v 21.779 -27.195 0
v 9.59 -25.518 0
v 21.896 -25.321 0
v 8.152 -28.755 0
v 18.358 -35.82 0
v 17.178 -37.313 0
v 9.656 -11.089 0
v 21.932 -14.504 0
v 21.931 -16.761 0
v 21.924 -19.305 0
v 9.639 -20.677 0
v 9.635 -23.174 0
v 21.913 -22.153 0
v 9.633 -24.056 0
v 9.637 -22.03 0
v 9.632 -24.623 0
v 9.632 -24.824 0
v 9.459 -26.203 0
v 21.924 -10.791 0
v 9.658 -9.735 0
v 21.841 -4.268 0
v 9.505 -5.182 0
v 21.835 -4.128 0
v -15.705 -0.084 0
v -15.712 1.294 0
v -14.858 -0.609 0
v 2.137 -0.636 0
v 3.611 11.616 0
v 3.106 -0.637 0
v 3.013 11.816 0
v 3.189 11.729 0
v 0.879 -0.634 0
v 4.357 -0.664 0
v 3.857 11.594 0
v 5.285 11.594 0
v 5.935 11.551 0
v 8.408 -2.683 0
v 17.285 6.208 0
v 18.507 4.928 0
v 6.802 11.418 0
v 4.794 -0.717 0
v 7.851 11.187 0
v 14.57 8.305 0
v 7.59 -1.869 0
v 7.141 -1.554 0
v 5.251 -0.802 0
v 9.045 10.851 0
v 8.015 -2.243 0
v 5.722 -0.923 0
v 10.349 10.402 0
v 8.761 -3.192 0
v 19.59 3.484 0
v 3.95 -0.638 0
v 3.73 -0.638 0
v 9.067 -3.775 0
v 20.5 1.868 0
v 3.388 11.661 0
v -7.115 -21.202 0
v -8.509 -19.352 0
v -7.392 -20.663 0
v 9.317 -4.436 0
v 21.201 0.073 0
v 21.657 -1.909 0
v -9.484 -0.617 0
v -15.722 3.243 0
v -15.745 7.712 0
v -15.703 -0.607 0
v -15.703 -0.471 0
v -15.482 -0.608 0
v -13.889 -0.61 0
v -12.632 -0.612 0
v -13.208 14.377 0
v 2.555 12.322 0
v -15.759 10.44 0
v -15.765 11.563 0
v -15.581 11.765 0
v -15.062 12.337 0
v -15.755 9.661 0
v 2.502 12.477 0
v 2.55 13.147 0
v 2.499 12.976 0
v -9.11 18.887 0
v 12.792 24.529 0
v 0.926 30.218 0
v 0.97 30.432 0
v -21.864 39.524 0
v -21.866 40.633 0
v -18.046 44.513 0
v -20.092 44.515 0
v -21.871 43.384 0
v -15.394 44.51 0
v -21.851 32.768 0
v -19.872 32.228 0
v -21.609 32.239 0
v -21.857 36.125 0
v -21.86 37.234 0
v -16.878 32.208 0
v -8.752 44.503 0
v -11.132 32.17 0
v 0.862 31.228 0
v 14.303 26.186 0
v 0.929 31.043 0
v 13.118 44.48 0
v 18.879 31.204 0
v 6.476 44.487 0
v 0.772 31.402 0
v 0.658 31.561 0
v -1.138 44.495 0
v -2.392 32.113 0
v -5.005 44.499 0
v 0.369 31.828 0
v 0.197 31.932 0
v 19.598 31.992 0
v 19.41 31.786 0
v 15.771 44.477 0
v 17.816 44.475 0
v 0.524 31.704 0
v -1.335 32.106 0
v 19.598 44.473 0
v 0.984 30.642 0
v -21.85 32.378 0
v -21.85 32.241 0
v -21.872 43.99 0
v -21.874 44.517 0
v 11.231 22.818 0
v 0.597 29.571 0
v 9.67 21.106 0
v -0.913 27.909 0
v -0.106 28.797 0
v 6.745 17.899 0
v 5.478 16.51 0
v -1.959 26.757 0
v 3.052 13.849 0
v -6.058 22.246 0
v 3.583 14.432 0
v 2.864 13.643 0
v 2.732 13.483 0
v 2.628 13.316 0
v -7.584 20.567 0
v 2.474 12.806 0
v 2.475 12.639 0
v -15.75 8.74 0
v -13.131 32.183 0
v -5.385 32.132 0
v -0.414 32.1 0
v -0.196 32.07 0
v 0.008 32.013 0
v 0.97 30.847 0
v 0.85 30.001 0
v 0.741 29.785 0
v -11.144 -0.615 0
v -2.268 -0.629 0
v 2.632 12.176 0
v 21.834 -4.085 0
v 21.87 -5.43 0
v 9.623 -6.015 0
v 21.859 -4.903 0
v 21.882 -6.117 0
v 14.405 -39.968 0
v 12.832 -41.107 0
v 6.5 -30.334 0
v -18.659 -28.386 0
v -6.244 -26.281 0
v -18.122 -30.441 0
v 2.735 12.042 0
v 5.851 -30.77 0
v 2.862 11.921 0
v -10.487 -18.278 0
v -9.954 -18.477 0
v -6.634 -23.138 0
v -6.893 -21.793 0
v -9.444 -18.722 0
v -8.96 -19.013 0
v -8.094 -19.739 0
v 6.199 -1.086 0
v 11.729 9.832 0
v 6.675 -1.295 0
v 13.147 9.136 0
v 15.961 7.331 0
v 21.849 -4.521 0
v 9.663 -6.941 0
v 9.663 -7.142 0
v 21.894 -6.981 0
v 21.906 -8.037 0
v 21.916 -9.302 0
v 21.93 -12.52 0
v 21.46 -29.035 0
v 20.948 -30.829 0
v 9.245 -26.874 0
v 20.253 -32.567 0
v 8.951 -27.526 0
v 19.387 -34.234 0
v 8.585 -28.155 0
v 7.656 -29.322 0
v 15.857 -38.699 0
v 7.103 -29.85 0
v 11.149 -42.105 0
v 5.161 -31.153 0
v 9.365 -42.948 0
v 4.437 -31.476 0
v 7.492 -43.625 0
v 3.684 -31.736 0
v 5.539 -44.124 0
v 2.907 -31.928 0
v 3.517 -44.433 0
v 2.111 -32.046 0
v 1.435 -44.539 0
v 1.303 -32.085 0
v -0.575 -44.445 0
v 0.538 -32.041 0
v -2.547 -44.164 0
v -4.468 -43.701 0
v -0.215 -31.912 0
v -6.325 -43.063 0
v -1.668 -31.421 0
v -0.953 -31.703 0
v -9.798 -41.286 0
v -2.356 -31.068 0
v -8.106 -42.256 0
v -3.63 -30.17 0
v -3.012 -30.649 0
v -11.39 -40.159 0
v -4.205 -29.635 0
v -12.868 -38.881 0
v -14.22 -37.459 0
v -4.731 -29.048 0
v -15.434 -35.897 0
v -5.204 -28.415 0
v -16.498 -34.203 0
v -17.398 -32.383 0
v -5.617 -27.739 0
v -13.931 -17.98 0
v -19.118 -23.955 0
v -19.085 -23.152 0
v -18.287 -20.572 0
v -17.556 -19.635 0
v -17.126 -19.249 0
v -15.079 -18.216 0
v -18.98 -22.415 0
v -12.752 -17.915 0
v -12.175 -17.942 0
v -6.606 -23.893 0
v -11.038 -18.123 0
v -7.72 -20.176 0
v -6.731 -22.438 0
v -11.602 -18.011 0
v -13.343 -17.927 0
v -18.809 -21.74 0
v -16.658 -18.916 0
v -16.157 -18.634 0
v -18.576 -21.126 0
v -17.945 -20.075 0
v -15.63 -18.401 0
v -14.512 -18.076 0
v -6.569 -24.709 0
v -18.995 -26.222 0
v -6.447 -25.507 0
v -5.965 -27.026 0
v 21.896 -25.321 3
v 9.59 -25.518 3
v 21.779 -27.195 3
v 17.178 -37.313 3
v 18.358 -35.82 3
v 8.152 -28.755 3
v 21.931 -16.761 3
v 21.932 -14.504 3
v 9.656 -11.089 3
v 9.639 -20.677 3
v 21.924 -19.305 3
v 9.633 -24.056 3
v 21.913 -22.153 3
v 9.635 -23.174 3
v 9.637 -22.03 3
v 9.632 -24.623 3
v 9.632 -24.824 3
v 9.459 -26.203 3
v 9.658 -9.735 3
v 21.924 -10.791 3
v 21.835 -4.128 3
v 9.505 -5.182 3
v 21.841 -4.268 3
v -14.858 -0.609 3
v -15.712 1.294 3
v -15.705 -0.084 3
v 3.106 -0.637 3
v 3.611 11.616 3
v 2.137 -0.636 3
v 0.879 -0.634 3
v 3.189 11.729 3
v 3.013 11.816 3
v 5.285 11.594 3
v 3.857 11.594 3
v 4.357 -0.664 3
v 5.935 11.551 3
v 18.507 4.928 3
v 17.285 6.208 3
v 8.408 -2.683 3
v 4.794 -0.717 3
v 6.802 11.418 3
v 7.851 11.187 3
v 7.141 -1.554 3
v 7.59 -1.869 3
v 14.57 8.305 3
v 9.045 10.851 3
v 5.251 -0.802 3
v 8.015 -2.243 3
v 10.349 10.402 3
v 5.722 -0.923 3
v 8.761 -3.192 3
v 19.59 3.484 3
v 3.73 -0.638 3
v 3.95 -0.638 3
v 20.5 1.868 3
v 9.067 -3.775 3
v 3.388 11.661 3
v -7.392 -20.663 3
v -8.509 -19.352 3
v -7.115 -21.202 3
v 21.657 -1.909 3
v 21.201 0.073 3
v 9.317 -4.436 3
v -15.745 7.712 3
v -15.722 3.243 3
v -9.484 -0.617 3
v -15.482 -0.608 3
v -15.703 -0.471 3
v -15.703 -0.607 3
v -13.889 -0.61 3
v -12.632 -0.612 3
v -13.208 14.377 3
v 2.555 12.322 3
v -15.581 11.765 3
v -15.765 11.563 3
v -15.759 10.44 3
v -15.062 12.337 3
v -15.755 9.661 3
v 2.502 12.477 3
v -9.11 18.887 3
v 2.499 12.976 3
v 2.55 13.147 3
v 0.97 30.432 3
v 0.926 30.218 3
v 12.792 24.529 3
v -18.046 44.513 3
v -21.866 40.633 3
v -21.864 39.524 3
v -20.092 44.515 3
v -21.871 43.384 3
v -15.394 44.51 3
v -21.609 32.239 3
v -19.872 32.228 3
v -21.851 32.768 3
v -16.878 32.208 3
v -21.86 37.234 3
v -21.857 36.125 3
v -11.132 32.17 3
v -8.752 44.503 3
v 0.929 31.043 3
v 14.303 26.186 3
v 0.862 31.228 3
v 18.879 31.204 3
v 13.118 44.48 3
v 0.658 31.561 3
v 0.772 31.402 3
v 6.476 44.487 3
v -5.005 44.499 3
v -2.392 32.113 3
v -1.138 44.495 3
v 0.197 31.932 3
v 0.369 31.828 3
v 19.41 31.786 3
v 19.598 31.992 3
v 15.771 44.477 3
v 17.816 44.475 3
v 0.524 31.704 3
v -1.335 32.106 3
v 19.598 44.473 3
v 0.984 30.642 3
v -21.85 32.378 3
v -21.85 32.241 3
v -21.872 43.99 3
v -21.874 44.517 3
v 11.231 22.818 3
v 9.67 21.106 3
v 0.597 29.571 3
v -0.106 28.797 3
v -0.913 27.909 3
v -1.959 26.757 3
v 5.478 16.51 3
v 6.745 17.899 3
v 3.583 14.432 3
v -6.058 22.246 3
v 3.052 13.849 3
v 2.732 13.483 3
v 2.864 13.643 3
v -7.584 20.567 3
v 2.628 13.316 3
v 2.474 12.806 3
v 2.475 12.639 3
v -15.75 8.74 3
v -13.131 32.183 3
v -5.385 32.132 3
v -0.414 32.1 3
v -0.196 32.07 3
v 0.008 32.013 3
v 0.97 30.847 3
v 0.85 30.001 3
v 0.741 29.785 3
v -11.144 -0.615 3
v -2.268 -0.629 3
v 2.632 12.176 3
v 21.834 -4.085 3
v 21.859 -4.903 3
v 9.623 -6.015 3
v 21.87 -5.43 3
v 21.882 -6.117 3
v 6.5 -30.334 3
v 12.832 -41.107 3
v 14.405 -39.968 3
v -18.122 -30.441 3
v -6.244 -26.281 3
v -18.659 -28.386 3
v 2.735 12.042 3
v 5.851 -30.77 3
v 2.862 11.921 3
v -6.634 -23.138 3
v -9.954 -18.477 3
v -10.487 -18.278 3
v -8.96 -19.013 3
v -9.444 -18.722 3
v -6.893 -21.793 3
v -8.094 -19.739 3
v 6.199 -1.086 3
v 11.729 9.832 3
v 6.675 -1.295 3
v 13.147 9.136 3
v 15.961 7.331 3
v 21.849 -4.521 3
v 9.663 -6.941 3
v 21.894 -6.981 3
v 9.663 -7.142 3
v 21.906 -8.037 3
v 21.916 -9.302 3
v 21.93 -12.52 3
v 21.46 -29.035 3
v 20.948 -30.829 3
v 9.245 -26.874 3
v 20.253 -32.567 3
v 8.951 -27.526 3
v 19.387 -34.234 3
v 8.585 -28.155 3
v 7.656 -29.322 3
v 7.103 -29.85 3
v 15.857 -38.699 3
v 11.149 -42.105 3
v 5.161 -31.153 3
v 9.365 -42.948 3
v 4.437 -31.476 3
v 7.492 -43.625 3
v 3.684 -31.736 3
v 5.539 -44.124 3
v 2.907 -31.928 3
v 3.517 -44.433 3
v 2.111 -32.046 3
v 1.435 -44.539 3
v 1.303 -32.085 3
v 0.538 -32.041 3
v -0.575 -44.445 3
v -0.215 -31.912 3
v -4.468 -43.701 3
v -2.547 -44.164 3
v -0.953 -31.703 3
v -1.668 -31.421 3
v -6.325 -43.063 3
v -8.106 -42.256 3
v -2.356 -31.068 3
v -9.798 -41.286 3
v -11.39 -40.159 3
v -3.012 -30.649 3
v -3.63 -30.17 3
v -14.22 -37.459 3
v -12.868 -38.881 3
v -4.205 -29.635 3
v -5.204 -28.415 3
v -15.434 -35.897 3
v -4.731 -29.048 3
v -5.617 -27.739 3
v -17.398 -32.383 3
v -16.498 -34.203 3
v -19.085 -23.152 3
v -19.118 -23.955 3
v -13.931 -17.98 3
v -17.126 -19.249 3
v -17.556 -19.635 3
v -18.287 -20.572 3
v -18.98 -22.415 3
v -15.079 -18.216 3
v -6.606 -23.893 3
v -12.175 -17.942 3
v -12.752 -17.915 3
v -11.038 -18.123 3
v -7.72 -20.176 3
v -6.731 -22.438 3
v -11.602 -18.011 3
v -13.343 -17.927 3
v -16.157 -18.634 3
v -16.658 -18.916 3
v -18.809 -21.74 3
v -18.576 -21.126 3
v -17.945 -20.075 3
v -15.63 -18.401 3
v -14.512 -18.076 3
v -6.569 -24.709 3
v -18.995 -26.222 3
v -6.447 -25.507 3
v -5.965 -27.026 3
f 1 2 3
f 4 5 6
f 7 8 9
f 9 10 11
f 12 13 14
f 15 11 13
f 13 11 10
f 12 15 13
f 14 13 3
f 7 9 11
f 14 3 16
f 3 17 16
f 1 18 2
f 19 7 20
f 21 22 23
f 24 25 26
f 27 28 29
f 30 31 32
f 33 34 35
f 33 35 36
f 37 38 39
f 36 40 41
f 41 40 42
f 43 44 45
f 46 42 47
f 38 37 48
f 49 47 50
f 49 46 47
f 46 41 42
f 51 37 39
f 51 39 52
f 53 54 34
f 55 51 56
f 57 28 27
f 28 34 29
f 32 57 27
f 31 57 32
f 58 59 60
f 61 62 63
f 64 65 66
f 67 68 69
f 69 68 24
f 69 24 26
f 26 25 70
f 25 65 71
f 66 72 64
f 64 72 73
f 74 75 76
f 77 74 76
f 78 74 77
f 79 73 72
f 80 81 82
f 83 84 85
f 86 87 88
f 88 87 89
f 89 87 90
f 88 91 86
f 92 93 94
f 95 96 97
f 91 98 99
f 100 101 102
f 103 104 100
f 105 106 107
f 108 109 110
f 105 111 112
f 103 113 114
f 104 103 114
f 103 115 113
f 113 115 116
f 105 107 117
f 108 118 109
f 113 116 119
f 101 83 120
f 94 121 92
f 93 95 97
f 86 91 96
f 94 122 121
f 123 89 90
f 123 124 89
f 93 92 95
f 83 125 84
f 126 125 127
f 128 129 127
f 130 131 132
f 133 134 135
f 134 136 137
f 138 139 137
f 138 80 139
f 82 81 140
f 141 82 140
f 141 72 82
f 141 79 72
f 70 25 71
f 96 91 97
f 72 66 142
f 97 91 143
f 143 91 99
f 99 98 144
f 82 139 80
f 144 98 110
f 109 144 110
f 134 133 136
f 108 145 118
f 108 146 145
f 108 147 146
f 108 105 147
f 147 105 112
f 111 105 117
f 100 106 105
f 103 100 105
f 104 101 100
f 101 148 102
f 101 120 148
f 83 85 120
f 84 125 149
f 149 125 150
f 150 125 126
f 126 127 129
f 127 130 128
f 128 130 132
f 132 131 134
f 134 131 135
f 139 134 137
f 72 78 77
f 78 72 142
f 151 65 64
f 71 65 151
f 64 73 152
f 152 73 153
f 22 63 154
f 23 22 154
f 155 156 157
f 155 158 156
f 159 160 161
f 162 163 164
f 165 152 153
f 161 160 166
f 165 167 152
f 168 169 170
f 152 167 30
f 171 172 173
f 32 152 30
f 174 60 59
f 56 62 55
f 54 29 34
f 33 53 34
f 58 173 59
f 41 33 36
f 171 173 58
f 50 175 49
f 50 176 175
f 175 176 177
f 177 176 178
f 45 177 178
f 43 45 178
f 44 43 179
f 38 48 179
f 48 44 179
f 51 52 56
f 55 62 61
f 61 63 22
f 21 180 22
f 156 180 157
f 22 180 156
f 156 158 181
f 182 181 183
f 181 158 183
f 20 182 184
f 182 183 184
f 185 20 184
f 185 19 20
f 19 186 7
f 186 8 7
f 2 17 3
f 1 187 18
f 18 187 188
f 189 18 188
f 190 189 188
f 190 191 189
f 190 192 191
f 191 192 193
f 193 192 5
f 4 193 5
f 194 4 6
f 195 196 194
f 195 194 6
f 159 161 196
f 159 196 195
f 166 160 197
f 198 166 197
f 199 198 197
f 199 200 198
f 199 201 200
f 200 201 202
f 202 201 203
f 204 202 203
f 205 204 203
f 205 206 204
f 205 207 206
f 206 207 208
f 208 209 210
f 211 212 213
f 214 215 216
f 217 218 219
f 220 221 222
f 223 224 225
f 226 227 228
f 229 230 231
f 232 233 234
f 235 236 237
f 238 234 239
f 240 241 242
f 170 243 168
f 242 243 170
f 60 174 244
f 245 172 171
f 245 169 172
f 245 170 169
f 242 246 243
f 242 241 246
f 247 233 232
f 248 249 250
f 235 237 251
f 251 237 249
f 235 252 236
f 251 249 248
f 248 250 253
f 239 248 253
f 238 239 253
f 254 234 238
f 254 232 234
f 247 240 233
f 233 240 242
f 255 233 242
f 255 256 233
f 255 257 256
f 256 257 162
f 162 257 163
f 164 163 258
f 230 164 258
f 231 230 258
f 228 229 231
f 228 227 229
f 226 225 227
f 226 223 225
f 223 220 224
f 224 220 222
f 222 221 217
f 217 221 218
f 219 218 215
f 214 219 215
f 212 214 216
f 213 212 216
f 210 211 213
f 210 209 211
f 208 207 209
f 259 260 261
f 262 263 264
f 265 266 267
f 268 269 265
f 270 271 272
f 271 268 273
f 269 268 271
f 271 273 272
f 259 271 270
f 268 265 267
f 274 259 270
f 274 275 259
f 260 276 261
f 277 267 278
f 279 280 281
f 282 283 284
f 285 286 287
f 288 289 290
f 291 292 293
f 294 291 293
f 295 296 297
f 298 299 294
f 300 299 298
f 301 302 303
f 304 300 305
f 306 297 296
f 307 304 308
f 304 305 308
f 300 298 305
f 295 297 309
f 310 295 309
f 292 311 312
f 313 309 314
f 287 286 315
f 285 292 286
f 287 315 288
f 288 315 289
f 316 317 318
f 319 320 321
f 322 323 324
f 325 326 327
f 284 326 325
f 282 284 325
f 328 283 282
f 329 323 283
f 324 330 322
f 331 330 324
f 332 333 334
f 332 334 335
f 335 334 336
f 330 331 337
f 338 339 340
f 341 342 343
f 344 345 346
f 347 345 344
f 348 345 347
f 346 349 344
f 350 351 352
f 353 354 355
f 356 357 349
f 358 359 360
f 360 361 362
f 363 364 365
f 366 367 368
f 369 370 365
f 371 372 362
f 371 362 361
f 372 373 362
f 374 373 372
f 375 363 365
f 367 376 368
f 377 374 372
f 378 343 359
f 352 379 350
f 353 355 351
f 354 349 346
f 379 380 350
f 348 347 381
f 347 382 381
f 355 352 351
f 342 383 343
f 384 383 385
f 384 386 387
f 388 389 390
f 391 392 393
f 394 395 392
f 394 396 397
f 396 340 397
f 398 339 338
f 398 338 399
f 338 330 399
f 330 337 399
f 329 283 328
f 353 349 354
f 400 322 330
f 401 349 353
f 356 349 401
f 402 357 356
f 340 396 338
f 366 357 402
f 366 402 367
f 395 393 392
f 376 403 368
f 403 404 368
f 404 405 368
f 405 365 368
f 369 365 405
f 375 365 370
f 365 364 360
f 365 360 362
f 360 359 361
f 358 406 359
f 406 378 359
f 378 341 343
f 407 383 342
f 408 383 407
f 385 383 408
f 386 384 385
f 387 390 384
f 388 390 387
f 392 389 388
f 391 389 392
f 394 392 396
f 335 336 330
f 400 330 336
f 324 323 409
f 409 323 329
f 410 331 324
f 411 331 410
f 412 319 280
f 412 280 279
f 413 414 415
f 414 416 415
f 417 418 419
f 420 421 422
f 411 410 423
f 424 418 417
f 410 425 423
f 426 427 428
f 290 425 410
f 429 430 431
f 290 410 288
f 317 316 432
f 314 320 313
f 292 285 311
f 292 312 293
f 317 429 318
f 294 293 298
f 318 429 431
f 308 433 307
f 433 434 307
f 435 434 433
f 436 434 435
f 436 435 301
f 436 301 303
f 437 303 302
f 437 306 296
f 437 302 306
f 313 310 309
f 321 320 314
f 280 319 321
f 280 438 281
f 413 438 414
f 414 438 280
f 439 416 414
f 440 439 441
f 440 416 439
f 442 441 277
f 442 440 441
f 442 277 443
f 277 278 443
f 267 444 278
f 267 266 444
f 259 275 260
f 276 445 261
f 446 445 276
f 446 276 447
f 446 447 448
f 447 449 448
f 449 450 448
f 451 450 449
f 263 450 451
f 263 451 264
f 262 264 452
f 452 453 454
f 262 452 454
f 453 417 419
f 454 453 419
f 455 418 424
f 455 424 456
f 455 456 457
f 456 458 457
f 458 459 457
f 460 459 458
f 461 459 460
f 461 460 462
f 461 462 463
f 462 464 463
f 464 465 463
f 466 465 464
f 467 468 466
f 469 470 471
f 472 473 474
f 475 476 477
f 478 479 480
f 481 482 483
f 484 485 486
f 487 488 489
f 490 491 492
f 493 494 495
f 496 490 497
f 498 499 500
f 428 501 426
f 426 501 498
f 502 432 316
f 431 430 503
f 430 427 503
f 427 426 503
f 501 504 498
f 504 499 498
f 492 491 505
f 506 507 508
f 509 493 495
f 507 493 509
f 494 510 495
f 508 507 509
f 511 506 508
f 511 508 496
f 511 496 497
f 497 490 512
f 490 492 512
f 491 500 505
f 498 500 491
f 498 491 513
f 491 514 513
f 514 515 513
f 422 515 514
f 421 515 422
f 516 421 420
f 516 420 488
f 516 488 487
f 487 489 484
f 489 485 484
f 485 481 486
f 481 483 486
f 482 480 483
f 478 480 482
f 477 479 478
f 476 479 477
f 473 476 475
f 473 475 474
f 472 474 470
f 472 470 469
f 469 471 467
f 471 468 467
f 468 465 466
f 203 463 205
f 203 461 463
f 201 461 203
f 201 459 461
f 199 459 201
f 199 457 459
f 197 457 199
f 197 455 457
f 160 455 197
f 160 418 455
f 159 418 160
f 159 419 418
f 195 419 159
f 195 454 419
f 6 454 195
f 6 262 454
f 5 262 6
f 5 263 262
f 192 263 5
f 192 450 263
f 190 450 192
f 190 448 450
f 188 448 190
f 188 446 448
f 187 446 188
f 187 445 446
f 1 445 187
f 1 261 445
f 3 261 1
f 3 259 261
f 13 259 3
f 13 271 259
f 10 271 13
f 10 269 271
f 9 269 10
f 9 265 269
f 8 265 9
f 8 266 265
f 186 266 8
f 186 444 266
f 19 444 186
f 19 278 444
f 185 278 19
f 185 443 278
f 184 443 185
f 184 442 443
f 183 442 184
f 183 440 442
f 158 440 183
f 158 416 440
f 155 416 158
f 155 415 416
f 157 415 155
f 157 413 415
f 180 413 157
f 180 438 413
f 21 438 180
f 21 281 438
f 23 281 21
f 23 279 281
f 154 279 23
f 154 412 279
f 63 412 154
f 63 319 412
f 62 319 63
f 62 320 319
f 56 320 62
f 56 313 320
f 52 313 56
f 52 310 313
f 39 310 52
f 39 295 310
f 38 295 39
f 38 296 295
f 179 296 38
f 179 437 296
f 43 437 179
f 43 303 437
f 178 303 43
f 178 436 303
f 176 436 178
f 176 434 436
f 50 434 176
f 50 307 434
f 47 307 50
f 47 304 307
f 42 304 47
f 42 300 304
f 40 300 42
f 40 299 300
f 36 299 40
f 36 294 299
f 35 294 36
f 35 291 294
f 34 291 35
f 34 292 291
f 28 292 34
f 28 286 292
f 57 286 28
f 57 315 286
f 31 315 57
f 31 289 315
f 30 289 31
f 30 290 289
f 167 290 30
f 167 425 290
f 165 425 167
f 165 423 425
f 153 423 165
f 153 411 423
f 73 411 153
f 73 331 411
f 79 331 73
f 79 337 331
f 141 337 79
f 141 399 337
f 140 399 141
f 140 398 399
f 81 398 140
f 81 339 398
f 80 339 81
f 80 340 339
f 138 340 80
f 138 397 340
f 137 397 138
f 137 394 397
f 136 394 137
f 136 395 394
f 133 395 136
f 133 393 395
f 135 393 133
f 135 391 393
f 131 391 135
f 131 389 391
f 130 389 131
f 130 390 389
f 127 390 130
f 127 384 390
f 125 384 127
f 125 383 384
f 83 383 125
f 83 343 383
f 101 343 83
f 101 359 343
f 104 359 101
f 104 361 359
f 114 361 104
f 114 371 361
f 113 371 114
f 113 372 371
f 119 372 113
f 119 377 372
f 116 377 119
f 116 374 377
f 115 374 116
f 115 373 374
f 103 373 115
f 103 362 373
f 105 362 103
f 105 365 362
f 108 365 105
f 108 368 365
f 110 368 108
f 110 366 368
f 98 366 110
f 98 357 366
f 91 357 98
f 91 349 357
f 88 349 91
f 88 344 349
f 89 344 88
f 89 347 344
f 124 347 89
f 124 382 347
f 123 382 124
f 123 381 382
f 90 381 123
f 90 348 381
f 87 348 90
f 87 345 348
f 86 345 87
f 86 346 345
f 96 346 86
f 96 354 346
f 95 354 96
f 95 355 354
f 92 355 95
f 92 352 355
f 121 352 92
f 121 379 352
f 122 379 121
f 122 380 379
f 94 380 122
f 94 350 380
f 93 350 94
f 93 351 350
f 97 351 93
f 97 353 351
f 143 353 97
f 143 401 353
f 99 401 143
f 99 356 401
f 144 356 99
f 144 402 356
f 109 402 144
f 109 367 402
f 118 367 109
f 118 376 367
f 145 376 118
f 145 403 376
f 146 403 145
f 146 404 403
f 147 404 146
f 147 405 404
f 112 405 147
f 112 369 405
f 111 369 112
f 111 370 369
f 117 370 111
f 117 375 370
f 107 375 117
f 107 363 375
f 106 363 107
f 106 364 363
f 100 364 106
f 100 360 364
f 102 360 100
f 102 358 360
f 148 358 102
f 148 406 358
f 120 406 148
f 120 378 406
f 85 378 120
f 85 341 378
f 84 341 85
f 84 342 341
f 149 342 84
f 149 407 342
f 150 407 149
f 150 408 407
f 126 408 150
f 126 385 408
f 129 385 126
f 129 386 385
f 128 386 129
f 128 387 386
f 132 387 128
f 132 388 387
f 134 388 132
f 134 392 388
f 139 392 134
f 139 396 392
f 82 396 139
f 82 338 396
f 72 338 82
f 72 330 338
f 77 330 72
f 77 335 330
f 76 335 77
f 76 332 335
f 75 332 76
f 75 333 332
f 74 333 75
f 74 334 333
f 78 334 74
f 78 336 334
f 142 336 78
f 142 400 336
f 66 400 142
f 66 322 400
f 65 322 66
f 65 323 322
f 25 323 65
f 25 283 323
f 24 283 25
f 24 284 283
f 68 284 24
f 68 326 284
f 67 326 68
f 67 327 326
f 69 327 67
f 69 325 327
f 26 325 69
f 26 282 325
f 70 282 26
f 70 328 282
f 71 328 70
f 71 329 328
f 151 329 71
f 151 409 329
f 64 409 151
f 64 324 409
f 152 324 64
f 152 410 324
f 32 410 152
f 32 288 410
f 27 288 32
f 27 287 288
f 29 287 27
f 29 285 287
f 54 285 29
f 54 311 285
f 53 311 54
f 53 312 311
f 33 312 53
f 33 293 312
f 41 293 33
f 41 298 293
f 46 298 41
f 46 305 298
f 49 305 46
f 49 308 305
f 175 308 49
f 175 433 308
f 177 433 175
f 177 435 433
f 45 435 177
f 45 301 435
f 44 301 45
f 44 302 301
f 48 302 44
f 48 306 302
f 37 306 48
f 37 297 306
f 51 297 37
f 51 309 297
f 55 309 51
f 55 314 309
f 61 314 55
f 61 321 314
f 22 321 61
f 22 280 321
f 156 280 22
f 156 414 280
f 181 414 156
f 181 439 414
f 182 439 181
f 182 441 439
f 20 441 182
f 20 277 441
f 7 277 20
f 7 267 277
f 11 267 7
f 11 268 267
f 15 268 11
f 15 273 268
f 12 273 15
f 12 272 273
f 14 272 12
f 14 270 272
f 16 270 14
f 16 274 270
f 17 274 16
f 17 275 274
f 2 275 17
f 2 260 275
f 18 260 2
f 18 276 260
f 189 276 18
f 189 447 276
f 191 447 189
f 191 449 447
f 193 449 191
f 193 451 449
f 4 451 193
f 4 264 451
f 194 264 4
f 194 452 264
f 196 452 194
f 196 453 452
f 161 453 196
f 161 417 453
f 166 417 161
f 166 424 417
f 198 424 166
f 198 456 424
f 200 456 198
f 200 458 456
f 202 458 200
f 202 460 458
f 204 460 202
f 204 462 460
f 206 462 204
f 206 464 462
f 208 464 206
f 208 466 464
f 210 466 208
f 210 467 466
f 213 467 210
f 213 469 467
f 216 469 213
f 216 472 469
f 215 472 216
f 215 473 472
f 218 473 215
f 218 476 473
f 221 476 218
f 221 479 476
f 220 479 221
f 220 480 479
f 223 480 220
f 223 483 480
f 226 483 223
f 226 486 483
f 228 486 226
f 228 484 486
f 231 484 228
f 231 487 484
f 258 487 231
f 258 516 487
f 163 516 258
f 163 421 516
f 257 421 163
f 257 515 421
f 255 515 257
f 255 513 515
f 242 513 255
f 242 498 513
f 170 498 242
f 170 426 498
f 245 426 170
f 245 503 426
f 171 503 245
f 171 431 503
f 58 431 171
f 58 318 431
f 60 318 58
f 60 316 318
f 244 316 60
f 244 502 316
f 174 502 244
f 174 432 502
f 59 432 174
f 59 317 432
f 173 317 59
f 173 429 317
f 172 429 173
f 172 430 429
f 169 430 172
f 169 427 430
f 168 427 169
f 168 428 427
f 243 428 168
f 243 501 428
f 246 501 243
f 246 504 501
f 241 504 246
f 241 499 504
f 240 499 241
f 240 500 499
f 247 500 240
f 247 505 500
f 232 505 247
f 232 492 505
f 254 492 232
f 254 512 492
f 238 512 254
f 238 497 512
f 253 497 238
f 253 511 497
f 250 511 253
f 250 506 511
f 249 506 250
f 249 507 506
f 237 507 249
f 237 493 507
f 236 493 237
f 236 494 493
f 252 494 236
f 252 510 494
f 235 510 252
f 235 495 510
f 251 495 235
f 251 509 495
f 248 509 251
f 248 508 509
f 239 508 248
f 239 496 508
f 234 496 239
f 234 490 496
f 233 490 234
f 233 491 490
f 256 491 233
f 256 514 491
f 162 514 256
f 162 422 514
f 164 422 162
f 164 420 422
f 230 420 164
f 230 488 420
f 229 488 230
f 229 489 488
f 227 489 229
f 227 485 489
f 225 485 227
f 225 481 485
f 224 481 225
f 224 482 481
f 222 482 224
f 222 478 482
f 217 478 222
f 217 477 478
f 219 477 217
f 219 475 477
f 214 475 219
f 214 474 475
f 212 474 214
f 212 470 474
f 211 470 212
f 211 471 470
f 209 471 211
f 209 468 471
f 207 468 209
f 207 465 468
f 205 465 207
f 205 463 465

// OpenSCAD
// Generated from 交通部公路局（原交通部公路總局）「新式號牌使用之英文字、數字字體」author trace
fudge = 0.1;

module glyph_2012_3(h = 3) {
  difference() {
    linear_extrude(height = h)
      polygon(points = [[-21.8736, 44.5172], [-21.8733, 44.3793], [-21.8725, 43.9897], [-21.8714, 43.3843], [-21.8699, 42.599], [-21.8681, 41.6699], [-21.8661, 40.6328], [-21.864, 39.5239], [-21.8618, 38.3789], [-21.8596, 37.234], [-21.8575, 36.125], [-21.8555, 35.088], [-21.8537, 34.1589], [-21.8522, 33.3736], [-21.851, 32.7681], [-21.8503, 32.3785], [-21.85, 32.2406], [-21.6093, 32.2391], [-20.9289, 32.2346], [-19.8718, 32.2276], [-18.5006, 32.2186], [-16.8782, 32.208], [-15.0674, 32.1961], [-13.131, 32.1834], [-11.1318, 32.1702], [-9.1326, 32.1571], [-7.1962, 32.1444], [-5.3854, 32.1325], [-3.763, 32.1218], [-2.3919, 32.1128], [-1.3347, 32.1059], [-0.6543, 32.1014], [-0.4136, 32.0998], [-0.1958, 32.0699], [0.0083, 32.0132], [0.1972, 31.932], [0.3695, 31.8282], [0.5237, 31.7039], [0.6582, 31.5611], [0.7716, 31.4019], [0.8625, 31.2284], [0.9292, 31.0426], [0.9704, 30.8466], [0.9845, 30.6424], [0.9701, 30.432], [0.9256, 30.2176], [0.8497, 30.0012], [0.7407, 29.7848], [0.5972, 29.5706], [0.4134, 29.3683], [-0.1059, 28.7968], [-0.9128, 27.9087], [-1.9594, 26.7569], [-3.1977, 25.394], [-4.5798, 23.8729], [-6.0578, 22.2462], [-7.5838, 20.5668], [-9.1097, 18.8874], [-10.5877, 17.2608], [-11.9699, 15.7396], [-13.2082, 14.3768], [-14.2548, 13.2249], [-15.0617, 12.3368], [-15.581, 11.7653], [-15.7648, 11.5631], [-15.7641, 11.4264], [-15.7621, 11.0401], [-15.759, 10.4399], [-15.7551, 9.6614], [-15.7504, 8.7403], [-15.7451, 7.7123], [-15.7395, 6.6129], [-15.7337, 5.4778], [-15.7279, 4.3428], [-15.7223, 3.2434], [-15.7171, 2.2153], [-15.7124, 1.2942], [-15.7084, 0.5157], [-15.7053, -0.0845], [-15.7034, -0.4708], [-15.7027, -0.6075], [-15.482, -0.6078], [-14.8582, -0.6088], [-13.889, -0.6103], [-12.6319, -0.6123], [-11.1445, -0.6146], [-9.4843, -0.6173], [-7.709, -0.6201], [-5.8762, -0.623], [-4.0433, -0.6259], [-2.268, -0.6287], [-0.6079, -0.6313], [0.8795, -0.6336], [2.1366, -0.6356], [3.1058, -0.6371], [3.7296, -0.6381], [3.9503, -0.6385], [4.3575, -0.6641], [4.7937, -0.717], [5.2511, -0.8018], [5.7222, -0.9233], [6.1993, -1.086], [6.6748, -1.2947], [7.1411, -1.5541], [7.5905, -1.8688], [8.0154, -2.2435], [8.4082, -2.683], [8.7612, -3.1919], [9.0669, -3.7748], [9.3175, -4.4365], [9.5055, -5.1817], [9.6232, -6.015], [9.663, -6.9411], [9.6627, -7.1419], [9.6617, -7.7095], [9.6602, -8.5914], [9.6582, -9.7353], [9.6558, -11.0888], [9.6532, -12.5994], [9.6504, -14.2149], [9.6475, -15.8827], [9.6446, -17.5505], [9.6418, -19.166], [9.6392, -20.6766], [9.6368, -22.0301], [9.6349, -23.174], [9.6333, -24.0559], [9.6323, -24.6235], [9.632, -24.8243], [9.5904, -25.5178], [9.4595, -26.2026], [9.2447, -26.8737], [8.9515, -27.5262], [8.5853, -28.1551], [8.1516, -28.7553], [7.6559, -29.322], [7.1035, -29.85], [6.5, -30.3344], [5.8509, -30.7703], [5.1615, -31.1526], [4.4374, -31.4762], [3.684, -31.7364], [2.9067, -31.928], [2.1111, -32.046], [1.3026, -32.0855], [0.538, -32.0406], [-0.2155, -31.9117], [-0.9527, -31.7035], [-1.6681, -31.4206], [-2.3564, -31.0676], [-3.0123, -30.6492], [-3.6304, -30.1701], [-4.2052, -29.6349], [-4.7315, -29.0483], [-5.2039, -28.4149], [-5.617, -27.7394], [-5.9655, -27.0264], [-6.244, -26.2806], [-6.4471, -25.5067], [-6.5695, -24.7092], [-6.6058, -23.8929], [-6.6339, -23.1378], [-6.7312, -22.4382], [-6.8932, -21.7932], [-7.1152, -21.2018], [-7.3924, -20.663], [-7.7201, -20.1757], [-8.0938, -19.7389], [-8.5088, -19.3517], [-8.9603, -19.013], [-9.4436, -18.7217], [-9.9542, -18.477], [-10.4874, -18.2777], [-11.0384, -18.1229], [-11.6025, -18.0115], [-12.1752, -17.9425], [-12.7518, -17.915], [-13.3429, -17.9274], [-13.9312, -17.9805], [-14.5116, -18.076], [-15.0794, -18.2156], [-15.6296, -18.401], [-16.1574, -18.634], [-16.6577, -18.9162], [-17.1257, -19.2494], [-17.5565, -19.6352], [-17.9451, -20.0755], [-18.2868, -20.5718], [-18.5765, -21.126], [-18.8093, -21.7397], [-18.9805, -22.4146], [-19.0849, -23.1525], [-19.1179, -23.955], [-18.9948, -26.2216], [-18.6588, -28.3857], [-18.1223, -30.4414], [-17.3978, -32.3827], [-16.4977, -34.2033], [-15.4344, -35.8974], [-14.2204, -37.4587], [-12.8681, -38.8813], [-11.39, -40.1591], [-9.7984, -41.286], [-8.106, -42.256], [-6.3249, -43.0629], [-4.4678, -43.7008], [-2.5471, -44.1636], [-0.5752, -44.4451], [1.4355, -44.5394], [3.5168, -44.4328], [5.5391, -44.1239], [7.4921, -43.6249], [9.3655, -42.9478], [11.1489, -42.1046], [12.8322, -41.1075], [14.4051, -39.9684], [15.8572, -38.6995], [17.1784, -37.3128], [18.3583, -35.8204], [19.3866, -34.2343], [20.2532, -32.5666], [20.9476, -30.8294], [21.4597, -29.0347], [21.7792, -27.1946], [21.8957, -25.3211], [21.9131, -22.1535], [21.9245, -19.3054], [21.9307, -16.761], [21.9323, -14.5044], [21.9299, -12.5196], [21.9243, -10.7908], [21.916, -9.3021], [21.9058, -8.0375], [21.8943, -6.9813], [21.8822, -6.1175], [21.8701, -5.4301], [21.8587, -4.9034], [21.8487, -4.5214], [21.8408, -4.2682], [21.8355, -4.128], [21.8336, -4.0847], [21.6573, -1.9091], [21.2011, 0.0727], [20.5002, 1.8679], [19.5904, 3.484], [18.5069, 4.9283], [17.2855, 6.2083], [15.9614, 7.3314], [14.5703, 8.3048], [13.1475, 9.1361], [11.7287, 9.8325], [10.3493, 10.4016], [9.0448, 10.8506], [7.8506, 11.187], [6.8023, 11.4181], [5.9354, 11.5513], [5.2854, 11.5941], [5.2693, 11.5941], [5.224, 11.5941], [5.1536, 11.5941], [5.0622, 11.5941], [4.9541, 11.5941], [4.8335, 11.5941], [4.7045, 11.5941], [4.5713, 11.5941], [4.4381, 11.5941], [4.3091, 11.5941], [4.1884, 11.5941], [4.0803, 11.5941], [3.989, 11.5941], [3.9185, 11.5941], [3.8732, 11.5941], [3.8572, 11.5941], [3.6111, 11.6156], [3.3882, 11.6611], [3.1889, 11.7287], [3.0134, 11.816], [2.8619, 11.9212], [2.7348, 12.0419], [2.6323, 12.1762], [2.5547, 12.3219], [2.5023, 12.4768], [2.4753, 12.6389], [2.4741, 12.806], [2.4989, 12.9761], [2.55, 13.147], [2.6276, 13.3165], [2.7321, 13.4826], [2.8637, 13.6432], [3.0516, 13.8493], [3.5827, 14.4317], [4.408, 15.3366], [5.4784, 16.5103], [6.745, 17.899], [8.1586, 19.449], [9.6702, 21.1065], [11.2309, 22.8177], [12.7916, 24.529], [14.3033, 26.1865], [15.7169, 27.7365], [16.9834, 29.1252], [18.0538, 30.2989], [18.8791, 31.2038], [19.4102, 31.7862], [19.5982, 31.9923], [19.5982, 32.1324], [19.5982, 32.5285], [19.5982, 33.1441], [19.5982, 33.9424], [19.5982, 34.887], [19.5982, 35.9413], [19.5982, 37.0688], [19.5982, 38.2328], [19.5982, 39.3968], [19.5982, 40.5242], [19.5982, 41.5785], [19.5982, 42.5231], [19.5982, 43.3215], [19.5982, 43.937], [19.5982, 44.3331], [19.5982, 44.4733], [19.1324, 44.4738], [17.8162, 44.4752], [15.771, 44.4773], [13.1182, 44.4802], [9.9795, 44.4835], [6.4763, 44.4872], [2.73, 44.4912], [-1.1377, 44.4953], [-5.0054, 44.4993], [-8.7516, 44.5033], [-12.2549, 44.507], [-15.3936, 44.5103], [-18.0463, 44.5132], [-20.0916, 44.5153], [-21.4078, 44.5167]]);
  }
}

glyph_2012_3();
